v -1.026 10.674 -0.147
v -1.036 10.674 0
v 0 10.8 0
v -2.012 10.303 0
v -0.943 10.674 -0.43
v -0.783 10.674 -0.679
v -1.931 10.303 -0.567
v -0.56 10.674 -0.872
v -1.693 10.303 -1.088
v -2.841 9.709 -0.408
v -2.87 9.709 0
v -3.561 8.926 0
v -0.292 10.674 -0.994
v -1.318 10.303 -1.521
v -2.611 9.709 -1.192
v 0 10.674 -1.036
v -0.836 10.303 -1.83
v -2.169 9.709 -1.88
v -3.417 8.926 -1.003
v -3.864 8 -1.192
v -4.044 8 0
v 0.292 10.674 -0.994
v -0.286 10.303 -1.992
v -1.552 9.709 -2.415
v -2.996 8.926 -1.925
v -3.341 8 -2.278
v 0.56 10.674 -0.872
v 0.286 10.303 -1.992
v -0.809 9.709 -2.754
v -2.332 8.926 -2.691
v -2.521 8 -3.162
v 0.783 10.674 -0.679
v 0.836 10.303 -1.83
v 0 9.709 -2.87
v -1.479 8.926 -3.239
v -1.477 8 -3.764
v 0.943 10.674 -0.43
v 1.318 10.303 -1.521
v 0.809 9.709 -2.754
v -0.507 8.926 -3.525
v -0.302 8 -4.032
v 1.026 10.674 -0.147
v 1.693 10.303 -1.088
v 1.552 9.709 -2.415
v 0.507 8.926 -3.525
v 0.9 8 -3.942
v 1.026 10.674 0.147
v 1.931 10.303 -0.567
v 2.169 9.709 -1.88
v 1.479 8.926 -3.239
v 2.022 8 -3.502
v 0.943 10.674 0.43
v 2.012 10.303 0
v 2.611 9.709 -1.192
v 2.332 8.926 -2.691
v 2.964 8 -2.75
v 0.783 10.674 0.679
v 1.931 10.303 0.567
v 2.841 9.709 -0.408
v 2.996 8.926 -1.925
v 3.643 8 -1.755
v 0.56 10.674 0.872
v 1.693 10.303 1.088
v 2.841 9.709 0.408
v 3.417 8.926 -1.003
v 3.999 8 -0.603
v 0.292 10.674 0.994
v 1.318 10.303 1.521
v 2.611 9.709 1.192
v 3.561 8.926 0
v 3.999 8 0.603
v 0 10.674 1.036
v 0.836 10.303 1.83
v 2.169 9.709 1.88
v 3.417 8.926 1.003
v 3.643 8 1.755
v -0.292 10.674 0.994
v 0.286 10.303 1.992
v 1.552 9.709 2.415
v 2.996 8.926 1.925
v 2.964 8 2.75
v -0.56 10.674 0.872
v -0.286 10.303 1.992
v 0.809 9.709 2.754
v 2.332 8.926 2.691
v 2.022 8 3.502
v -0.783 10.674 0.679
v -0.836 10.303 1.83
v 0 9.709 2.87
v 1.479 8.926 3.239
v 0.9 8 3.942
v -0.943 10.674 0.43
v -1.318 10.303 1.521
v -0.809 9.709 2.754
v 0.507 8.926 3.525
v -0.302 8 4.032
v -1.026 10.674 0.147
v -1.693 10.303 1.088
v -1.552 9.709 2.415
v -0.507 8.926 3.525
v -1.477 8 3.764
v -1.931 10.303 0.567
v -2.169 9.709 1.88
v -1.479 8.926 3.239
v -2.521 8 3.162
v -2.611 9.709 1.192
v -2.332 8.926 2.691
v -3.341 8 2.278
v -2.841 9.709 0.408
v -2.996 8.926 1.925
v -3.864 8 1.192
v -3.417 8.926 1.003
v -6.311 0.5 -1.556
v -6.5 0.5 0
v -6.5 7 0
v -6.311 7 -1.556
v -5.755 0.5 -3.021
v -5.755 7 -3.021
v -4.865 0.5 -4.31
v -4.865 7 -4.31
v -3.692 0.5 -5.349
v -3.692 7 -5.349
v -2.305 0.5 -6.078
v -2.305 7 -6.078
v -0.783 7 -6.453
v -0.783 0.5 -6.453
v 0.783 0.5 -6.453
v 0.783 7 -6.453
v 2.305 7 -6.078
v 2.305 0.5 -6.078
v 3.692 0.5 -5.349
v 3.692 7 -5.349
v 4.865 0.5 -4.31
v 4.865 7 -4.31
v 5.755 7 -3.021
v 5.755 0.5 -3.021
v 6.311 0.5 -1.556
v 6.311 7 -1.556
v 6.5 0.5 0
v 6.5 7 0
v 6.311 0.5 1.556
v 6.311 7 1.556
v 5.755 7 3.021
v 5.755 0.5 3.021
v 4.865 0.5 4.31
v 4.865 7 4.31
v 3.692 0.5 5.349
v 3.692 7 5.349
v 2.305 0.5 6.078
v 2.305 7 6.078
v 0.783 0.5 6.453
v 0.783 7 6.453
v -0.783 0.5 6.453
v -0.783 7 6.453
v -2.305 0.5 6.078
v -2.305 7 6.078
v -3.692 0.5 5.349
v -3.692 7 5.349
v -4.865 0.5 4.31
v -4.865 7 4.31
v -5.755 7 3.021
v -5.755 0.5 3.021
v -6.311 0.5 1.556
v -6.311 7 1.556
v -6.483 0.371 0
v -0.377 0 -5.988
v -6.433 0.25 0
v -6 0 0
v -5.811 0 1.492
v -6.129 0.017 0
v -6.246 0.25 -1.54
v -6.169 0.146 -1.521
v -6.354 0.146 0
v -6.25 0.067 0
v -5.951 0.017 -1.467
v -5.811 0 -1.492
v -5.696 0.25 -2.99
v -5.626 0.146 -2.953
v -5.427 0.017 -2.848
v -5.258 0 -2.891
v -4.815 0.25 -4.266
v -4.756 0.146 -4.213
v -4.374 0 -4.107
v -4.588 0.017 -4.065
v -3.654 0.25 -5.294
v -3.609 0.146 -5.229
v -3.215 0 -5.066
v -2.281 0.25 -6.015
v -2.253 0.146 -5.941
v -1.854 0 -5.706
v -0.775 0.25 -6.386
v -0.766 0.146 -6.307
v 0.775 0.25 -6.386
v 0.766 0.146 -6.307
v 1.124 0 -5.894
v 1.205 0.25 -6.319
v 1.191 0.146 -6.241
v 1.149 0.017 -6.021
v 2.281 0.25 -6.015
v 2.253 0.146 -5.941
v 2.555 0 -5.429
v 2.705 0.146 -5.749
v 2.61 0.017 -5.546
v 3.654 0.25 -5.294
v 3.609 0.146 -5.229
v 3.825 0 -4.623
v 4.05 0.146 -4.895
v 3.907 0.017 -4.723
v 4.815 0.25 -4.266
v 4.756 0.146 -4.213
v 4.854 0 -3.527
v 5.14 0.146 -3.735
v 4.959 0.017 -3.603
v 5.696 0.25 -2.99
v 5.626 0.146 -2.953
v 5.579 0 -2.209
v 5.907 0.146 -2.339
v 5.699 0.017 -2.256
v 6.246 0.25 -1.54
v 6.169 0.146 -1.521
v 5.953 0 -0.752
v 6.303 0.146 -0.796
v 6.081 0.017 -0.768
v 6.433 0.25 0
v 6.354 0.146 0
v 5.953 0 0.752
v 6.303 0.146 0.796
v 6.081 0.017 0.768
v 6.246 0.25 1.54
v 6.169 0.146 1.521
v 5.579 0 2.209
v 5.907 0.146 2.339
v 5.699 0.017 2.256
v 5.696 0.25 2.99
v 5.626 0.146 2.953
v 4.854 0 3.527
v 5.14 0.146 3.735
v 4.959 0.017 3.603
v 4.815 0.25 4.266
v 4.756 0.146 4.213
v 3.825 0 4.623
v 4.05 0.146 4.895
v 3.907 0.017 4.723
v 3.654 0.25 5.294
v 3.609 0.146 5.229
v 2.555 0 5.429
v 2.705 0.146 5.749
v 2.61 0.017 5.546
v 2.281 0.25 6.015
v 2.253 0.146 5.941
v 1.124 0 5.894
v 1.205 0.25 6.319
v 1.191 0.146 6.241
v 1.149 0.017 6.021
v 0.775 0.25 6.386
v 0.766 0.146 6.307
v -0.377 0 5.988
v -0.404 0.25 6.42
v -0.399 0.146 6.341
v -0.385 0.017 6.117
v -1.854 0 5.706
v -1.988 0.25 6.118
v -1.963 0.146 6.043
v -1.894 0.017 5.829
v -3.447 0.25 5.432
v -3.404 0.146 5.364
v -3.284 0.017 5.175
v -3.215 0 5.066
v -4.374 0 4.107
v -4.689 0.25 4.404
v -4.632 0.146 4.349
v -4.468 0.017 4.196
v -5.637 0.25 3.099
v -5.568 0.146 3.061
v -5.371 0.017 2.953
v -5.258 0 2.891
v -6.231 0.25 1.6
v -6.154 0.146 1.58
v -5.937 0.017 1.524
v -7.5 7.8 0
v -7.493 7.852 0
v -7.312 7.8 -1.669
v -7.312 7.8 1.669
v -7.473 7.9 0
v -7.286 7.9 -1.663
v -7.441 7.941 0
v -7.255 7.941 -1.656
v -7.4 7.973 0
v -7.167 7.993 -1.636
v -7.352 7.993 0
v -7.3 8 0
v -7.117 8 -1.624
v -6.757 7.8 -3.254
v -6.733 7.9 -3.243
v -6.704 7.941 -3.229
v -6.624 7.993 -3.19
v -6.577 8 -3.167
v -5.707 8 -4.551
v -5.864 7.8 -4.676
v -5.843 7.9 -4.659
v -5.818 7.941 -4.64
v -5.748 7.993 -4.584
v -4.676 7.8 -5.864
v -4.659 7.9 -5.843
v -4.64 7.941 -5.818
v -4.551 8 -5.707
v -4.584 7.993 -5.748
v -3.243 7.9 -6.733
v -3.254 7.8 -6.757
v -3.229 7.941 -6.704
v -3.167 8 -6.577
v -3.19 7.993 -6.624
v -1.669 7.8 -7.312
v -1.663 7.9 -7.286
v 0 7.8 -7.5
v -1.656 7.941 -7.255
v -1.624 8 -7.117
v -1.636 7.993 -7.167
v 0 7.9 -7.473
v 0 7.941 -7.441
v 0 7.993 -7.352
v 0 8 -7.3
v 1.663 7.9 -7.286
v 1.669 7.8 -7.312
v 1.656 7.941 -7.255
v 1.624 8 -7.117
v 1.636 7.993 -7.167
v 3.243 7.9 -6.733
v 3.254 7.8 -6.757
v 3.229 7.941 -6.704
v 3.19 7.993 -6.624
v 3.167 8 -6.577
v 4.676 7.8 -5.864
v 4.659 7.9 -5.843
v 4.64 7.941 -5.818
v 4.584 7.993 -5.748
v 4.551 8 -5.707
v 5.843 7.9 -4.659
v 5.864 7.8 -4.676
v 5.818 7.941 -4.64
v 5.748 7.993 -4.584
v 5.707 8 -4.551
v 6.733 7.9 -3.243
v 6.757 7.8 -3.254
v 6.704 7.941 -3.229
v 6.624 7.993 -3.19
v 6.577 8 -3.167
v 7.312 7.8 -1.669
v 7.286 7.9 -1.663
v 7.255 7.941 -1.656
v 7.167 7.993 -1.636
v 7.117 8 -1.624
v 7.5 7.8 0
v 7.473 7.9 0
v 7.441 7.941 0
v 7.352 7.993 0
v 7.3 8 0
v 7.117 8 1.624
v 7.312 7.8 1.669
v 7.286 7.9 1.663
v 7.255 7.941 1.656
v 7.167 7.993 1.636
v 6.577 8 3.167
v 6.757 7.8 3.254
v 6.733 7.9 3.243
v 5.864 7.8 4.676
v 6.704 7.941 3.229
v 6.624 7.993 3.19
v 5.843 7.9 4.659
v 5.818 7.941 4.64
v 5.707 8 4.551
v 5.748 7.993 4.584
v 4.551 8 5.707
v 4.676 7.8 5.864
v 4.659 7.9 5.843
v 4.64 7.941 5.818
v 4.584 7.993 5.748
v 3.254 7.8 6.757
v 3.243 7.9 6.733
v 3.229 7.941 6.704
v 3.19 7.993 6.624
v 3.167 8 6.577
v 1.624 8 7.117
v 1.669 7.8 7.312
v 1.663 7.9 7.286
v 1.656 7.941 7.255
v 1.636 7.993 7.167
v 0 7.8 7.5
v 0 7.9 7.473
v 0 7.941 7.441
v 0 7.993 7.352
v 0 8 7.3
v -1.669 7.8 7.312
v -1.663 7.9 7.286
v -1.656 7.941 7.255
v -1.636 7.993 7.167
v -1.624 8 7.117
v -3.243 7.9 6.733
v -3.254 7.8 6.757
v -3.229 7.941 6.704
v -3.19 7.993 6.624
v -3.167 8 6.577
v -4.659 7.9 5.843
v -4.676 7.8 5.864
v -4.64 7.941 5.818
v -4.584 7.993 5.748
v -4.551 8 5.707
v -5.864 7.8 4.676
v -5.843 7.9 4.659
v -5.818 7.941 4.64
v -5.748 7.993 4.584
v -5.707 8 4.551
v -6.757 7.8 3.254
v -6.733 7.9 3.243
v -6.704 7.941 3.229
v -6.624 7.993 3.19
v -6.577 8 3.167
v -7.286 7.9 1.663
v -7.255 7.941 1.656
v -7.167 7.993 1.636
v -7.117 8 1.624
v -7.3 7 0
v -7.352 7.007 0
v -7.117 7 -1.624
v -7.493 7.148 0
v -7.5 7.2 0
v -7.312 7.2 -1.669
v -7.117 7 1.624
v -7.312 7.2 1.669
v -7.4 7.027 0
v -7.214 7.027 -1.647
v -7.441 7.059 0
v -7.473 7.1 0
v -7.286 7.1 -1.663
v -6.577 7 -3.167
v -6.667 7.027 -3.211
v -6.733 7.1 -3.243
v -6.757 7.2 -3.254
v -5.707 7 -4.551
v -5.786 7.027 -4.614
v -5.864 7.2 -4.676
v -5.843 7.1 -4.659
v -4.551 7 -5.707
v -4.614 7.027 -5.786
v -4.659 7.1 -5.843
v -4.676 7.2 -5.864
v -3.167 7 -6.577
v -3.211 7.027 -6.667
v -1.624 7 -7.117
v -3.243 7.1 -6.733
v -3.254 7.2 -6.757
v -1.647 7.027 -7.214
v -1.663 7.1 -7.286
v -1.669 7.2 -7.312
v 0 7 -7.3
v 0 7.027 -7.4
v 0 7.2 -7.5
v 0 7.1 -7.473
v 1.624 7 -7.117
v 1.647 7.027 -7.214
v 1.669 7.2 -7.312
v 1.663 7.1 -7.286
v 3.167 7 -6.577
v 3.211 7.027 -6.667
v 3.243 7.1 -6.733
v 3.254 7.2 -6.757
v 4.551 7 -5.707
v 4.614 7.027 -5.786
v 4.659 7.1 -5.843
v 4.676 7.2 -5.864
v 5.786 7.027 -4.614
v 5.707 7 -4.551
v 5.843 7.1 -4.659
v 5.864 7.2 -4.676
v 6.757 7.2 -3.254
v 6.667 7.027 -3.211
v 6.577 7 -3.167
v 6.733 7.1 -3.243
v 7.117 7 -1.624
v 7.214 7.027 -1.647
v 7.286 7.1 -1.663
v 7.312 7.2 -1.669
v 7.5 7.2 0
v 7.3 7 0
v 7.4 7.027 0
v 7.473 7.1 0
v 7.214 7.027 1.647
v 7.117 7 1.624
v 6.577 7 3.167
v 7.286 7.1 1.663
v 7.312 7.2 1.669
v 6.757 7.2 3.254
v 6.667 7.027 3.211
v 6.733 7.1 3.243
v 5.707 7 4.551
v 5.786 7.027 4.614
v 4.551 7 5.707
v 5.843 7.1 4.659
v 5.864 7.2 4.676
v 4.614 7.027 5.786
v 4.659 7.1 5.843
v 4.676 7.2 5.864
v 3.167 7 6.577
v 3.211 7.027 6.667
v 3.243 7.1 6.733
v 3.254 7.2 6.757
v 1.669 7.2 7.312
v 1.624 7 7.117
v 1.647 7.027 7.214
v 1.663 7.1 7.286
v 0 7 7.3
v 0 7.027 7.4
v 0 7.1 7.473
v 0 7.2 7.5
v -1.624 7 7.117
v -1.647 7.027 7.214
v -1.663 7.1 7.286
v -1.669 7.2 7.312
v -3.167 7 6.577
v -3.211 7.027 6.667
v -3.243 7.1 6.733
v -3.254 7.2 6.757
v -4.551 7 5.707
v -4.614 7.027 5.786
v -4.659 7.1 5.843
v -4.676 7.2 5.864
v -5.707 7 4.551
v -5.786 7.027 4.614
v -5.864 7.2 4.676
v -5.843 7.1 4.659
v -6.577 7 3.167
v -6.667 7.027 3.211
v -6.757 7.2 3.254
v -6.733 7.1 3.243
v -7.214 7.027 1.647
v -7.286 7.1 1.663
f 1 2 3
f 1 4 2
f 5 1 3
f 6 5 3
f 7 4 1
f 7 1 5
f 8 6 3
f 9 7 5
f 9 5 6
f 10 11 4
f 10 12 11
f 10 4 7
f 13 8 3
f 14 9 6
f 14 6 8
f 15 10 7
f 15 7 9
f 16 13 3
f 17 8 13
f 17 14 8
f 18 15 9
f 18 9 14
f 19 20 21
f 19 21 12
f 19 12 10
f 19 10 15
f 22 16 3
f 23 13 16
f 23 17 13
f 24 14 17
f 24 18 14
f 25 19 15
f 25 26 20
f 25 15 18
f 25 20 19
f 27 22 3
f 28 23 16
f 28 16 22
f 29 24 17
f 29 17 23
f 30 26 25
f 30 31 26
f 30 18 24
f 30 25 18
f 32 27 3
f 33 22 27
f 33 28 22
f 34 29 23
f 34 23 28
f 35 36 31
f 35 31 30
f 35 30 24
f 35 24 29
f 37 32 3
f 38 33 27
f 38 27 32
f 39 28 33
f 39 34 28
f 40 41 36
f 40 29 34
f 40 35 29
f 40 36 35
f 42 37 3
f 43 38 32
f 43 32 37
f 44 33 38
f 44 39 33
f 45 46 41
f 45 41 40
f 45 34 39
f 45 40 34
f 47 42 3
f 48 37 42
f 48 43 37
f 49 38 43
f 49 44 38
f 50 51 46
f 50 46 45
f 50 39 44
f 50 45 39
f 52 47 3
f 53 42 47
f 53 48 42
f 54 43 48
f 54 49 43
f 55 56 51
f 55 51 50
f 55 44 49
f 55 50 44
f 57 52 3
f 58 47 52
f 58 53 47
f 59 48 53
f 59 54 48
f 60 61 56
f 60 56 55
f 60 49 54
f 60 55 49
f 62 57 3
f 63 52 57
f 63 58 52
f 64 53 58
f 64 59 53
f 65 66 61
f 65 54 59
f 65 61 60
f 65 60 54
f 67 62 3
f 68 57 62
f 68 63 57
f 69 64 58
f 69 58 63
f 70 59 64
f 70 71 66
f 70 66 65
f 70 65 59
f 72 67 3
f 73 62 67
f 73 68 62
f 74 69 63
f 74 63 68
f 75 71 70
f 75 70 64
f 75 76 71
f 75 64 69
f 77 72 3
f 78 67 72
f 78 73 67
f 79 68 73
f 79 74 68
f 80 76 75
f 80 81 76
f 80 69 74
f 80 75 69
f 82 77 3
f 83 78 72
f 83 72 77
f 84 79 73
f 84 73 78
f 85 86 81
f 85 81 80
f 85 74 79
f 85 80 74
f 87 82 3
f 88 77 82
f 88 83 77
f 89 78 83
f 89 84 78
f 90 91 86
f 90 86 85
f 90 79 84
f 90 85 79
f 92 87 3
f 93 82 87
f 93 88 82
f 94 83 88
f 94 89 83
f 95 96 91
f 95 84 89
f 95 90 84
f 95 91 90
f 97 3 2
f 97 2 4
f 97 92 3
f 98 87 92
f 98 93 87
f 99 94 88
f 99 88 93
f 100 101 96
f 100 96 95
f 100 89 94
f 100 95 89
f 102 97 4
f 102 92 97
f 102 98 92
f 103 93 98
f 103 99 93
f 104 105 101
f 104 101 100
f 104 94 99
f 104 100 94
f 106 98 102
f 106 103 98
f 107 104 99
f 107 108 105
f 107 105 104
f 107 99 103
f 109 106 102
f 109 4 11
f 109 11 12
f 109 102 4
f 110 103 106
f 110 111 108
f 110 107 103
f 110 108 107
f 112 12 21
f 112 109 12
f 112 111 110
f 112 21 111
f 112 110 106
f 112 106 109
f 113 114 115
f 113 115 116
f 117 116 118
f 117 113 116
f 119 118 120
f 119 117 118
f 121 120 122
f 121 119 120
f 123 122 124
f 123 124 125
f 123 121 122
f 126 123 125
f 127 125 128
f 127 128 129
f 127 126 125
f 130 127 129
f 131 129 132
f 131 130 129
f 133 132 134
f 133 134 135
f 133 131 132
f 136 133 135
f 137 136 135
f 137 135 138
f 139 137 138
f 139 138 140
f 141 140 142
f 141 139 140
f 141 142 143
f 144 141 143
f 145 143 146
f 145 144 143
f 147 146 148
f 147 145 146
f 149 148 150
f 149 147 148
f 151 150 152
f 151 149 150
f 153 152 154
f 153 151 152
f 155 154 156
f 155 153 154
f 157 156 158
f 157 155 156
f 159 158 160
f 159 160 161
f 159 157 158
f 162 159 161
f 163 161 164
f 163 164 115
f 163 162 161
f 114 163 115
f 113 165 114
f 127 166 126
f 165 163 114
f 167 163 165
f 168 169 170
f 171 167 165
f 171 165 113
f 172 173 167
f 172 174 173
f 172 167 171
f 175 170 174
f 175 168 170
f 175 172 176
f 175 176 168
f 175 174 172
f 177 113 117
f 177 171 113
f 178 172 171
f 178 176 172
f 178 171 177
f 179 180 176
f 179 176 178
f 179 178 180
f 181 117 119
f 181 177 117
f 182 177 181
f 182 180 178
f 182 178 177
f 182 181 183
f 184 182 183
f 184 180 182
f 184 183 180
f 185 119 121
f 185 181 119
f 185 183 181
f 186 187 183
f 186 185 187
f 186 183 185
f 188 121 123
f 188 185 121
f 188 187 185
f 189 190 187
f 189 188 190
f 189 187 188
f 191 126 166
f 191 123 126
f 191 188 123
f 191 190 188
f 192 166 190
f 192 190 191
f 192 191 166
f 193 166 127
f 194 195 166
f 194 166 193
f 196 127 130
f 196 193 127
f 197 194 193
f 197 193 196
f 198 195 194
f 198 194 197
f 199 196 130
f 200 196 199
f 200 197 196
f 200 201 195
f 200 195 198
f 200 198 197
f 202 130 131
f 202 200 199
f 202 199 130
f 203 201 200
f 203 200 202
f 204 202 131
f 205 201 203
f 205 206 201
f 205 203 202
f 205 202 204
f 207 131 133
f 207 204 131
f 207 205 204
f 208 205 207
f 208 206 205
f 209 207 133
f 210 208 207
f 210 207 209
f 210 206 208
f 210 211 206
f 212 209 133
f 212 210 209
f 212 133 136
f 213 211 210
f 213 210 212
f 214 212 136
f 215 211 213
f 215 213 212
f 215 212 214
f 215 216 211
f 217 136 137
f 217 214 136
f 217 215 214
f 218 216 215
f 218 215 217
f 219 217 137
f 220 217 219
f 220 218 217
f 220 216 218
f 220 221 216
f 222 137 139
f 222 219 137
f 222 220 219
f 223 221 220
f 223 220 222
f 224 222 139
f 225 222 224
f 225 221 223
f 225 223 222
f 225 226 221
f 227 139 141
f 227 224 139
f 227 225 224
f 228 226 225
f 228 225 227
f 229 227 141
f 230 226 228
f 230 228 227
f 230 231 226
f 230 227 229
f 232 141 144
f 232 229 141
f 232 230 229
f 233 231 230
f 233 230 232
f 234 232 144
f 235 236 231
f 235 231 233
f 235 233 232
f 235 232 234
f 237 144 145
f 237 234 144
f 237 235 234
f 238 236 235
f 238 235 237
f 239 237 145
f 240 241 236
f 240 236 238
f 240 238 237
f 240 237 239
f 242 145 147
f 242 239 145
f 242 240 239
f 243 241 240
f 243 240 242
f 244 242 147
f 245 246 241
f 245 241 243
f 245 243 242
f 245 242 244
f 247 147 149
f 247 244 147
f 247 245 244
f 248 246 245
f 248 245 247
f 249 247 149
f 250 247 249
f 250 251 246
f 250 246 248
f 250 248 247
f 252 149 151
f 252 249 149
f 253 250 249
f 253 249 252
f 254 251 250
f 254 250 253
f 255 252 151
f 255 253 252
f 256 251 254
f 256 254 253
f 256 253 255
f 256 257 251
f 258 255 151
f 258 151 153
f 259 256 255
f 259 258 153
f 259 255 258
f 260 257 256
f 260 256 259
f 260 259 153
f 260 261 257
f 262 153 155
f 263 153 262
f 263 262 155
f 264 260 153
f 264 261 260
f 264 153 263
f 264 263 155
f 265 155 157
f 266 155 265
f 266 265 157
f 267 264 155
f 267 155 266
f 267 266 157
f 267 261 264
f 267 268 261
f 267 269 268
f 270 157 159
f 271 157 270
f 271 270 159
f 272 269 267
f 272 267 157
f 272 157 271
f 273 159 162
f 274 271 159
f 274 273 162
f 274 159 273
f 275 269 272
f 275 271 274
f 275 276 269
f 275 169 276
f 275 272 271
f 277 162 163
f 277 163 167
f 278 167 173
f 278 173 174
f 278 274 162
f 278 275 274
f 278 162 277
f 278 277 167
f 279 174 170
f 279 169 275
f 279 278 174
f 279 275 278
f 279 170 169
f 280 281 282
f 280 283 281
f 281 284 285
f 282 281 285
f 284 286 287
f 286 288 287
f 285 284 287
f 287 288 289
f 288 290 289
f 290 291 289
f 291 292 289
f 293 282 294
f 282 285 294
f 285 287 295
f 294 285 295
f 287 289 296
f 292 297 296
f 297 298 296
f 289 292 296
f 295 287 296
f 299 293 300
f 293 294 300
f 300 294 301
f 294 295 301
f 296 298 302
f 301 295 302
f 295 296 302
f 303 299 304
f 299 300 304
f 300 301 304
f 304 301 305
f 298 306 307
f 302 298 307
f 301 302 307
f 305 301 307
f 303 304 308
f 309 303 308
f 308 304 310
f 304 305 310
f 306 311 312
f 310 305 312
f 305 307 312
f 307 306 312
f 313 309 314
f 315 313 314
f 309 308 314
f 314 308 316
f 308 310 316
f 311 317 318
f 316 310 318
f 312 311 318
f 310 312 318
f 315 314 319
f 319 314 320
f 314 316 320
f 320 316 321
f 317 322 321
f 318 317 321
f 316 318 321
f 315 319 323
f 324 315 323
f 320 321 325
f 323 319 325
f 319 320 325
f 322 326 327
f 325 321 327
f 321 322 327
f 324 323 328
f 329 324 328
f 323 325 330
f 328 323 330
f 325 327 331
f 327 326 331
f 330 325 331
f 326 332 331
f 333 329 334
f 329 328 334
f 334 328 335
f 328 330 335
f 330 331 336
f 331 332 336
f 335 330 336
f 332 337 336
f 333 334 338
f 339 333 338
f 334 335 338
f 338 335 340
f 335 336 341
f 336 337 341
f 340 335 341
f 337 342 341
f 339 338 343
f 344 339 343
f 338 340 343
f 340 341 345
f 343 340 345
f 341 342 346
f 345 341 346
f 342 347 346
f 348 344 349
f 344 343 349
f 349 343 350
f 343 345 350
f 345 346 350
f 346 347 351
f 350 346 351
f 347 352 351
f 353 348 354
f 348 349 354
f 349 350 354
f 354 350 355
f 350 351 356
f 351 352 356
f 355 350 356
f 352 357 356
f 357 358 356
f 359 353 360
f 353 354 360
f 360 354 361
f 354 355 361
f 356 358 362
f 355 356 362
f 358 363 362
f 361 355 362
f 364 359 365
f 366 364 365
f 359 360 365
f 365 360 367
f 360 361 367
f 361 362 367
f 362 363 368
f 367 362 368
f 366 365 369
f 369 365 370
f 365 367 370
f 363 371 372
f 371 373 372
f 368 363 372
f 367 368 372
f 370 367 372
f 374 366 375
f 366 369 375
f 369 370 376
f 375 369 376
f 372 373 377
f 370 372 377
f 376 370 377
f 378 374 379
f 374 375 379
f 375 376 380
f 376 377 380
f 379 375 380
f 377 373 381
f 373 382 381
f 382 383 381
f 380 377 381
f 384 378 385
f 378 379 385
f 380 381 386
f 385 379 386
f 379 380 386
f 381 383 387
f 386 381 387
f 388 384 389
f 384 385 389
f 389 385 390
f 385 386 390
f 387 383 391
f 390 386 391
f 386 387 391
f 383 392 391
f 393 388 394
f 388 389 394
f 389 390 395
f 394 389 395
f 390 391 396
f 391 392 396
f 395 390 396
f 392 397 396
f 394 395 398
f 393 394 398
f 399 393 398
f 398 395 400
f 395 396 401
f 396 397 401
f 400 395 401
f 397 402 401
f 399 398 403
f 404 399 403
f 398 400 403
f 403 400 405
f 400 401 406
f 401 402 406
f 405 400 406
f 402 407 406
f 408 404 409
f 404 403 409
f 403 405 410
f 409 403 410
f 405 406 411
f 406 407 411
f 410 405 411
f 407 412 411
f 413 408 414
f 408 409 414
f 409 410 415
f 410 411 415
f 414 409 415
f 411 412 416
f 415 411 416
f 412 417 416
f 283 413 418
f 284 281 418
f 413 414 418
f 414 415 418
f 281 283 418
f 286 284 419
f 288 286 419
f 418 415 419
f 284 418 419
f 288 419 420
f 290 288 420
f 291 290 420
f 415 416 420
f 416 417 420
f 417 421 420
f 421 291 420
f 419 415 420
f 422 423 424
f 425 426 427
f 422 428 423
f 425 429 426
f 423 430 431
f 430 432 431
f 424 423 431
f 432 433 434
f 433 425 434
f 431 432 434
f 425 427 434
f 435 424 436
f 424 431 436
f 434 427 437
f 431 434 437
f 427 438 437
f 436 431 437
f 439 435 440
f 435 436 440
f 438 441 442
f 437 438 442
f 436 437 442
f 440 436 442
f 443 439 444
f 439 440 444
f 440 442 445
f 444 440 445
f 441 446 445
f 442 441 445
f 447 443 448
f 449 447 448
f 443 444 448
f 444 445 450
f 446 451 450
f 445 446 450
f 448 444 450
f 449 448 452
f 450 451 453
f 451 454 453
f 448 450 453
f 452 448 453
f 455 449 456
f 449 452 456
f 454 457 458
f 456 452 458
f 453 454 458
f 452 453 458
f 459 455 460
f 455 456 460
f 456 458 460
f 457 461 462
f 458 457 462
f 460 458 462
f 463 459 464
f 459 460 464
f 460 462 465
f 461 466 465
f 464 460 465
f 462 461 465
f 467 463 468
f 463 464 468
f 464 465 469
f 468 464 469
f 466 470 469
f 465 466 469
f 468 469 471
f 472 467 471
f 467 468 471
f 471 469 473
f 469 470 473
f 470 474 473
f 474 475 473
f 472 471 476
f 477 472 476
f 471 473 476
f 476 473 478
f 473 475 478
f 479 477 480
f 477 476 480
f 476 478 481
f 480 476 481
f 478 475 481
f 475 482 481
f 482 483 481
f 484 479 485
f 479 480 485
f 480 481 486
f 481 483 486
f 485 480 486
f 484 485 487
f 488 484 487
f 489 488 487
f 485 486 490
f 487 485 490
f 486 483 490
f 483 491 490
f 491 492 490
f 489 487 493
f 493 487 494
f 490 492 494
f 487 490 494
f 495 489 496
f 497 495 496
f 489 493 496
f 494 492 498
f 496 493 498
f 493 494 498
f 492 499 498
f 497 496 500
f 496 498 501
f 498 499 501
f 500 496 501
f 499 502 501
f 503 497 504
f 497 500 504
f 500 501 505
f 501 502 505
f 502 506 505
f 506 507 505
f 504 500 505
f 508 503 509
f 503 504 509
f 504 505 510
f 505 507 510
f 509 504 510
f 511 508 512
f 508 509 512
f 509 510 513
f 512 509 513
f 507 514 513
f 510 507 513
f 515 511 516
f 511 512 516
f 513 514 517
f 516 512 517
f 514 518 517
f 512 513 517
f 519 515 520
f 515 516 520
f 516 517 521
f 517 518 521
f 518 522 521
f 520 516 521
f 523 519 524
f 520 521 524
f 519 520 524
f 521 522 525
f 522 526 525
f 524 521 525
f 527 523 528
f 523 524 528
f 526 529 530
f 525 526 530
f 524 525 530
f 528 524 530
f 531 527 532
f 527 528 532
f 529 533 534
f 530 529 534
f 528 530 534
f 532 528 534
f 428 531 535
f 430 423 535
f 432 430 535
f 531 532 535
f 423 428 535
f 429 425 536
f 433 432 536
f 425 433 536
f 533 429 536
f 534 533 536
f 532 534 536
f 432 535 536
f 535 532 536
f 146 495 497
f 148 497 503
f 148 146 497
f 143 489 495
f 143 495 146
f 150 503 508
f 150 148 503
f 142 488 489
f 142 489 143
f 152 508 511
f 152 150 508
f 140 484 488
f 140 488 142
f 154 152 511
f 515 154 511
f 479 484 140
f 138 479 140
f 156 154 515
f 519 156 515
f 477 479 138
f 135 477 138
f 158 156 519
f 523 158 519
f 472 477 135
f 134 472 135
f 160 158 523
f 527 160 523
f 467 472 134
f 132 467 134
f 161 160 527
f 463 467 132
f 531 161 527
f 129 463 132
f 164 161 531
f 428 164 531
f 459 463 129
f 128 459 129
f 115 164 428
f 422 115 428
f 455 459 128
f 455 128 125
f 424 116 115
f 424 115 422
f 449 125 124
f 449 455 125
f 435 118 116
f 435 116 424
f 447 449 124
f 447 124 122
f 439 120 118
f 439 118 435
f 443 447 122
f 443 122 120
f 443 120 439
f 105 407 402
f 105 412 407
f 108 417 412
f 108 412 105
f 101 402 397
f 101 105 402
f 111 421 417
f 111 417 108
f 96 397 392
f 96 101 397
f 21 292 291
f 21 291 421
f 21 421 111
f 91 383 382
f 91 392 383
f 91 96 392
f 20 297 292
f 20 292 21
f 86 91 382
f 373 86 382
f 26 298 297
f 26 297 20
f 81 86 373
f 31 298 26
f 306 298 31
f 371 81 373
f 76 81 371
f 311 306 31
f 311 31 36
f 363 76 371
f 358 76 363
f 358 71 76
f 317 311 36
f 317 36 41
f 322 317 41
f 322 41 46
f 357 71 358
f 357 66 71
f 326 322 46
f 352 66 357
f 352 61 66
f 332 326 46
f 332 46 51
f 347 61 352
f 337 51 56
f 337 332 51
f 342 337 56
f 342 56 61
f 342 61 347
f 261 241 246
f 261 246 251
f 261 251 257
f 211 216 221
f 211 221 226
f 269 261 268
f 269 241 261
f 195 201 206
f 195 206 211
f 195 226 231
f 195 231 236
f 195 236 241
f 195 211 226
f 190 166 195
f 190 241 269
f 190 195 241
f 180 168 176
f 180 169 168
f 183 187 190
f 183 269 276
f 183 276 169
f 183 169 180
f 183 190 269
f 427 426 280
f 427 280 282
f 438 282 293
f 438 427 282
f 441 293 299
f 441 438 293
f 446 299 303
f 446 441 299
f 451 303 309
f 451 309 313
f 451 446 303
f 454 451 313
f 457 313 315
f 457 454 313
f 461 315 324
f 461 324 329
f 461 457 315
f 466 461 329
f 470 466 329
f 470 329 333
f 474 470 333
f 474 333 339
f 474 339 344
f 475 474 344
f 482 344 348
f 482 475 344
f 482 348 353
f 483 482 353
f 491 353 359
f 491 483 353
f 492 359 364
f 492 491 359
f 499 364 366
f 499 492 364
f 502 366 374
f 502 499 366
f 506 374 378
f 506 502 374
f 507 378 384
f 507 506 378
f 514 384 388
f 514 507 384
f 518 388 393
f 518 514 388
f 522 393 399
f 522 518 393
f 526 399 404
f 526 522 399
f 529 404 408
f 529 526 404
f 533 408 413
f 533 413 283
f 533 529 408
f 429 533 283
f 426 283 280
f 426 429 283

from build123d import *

# Parameters (mm, degrees)
FILLET_1_R = 0.5
FILLET_2_R = 0.2


with BuildPart() as part:
    # 草图1 → 旋转4 (revolve)
    with BuildSketch(Plane.XY, mode=Mode.PRIVATE) as revolve_4_sk:
        with BuildLine():
            Line((4.043760626, 8), (7.5, 8))
            Line((7.5, 8), (7.5, 7))
            Line((7.5, 7), (6.5, 7))
            Line((6.5, 7), (6.5, 0))
            Line((6.5, 0), (0, 0))
            Line((0, 0), (0, 10.8))
            ThreePointArc((0, 10.8), (2.459268184, 10.031675661), (4.043760626, 8))
        make_face()
    revolve(revolve_4_sk.sketch.rotate(Axis((0, 28.404003486, 0), (0, -1, 0)), 180), axis=Axis((0, 28.404003486, 0), (0, -1, 0)))

    # 圆角1
    fillet_1_edges = [part.edges().sort_by_distance(p)[0] for p in [
        (6.5, 0, 0),
    ]]
    fillet(fillet_1_edges, radius=FILLET_1_R)

    # 圆角2
    fillet_2_edges = [part.edges().sort_by_distance(p)[0] for p in [
        (7.5, 8, 0),
        (7.5, 7, 0),
    ]]
    fillet(fillet_2_edges, radius=FILLET_2_R)


solid = part.part
